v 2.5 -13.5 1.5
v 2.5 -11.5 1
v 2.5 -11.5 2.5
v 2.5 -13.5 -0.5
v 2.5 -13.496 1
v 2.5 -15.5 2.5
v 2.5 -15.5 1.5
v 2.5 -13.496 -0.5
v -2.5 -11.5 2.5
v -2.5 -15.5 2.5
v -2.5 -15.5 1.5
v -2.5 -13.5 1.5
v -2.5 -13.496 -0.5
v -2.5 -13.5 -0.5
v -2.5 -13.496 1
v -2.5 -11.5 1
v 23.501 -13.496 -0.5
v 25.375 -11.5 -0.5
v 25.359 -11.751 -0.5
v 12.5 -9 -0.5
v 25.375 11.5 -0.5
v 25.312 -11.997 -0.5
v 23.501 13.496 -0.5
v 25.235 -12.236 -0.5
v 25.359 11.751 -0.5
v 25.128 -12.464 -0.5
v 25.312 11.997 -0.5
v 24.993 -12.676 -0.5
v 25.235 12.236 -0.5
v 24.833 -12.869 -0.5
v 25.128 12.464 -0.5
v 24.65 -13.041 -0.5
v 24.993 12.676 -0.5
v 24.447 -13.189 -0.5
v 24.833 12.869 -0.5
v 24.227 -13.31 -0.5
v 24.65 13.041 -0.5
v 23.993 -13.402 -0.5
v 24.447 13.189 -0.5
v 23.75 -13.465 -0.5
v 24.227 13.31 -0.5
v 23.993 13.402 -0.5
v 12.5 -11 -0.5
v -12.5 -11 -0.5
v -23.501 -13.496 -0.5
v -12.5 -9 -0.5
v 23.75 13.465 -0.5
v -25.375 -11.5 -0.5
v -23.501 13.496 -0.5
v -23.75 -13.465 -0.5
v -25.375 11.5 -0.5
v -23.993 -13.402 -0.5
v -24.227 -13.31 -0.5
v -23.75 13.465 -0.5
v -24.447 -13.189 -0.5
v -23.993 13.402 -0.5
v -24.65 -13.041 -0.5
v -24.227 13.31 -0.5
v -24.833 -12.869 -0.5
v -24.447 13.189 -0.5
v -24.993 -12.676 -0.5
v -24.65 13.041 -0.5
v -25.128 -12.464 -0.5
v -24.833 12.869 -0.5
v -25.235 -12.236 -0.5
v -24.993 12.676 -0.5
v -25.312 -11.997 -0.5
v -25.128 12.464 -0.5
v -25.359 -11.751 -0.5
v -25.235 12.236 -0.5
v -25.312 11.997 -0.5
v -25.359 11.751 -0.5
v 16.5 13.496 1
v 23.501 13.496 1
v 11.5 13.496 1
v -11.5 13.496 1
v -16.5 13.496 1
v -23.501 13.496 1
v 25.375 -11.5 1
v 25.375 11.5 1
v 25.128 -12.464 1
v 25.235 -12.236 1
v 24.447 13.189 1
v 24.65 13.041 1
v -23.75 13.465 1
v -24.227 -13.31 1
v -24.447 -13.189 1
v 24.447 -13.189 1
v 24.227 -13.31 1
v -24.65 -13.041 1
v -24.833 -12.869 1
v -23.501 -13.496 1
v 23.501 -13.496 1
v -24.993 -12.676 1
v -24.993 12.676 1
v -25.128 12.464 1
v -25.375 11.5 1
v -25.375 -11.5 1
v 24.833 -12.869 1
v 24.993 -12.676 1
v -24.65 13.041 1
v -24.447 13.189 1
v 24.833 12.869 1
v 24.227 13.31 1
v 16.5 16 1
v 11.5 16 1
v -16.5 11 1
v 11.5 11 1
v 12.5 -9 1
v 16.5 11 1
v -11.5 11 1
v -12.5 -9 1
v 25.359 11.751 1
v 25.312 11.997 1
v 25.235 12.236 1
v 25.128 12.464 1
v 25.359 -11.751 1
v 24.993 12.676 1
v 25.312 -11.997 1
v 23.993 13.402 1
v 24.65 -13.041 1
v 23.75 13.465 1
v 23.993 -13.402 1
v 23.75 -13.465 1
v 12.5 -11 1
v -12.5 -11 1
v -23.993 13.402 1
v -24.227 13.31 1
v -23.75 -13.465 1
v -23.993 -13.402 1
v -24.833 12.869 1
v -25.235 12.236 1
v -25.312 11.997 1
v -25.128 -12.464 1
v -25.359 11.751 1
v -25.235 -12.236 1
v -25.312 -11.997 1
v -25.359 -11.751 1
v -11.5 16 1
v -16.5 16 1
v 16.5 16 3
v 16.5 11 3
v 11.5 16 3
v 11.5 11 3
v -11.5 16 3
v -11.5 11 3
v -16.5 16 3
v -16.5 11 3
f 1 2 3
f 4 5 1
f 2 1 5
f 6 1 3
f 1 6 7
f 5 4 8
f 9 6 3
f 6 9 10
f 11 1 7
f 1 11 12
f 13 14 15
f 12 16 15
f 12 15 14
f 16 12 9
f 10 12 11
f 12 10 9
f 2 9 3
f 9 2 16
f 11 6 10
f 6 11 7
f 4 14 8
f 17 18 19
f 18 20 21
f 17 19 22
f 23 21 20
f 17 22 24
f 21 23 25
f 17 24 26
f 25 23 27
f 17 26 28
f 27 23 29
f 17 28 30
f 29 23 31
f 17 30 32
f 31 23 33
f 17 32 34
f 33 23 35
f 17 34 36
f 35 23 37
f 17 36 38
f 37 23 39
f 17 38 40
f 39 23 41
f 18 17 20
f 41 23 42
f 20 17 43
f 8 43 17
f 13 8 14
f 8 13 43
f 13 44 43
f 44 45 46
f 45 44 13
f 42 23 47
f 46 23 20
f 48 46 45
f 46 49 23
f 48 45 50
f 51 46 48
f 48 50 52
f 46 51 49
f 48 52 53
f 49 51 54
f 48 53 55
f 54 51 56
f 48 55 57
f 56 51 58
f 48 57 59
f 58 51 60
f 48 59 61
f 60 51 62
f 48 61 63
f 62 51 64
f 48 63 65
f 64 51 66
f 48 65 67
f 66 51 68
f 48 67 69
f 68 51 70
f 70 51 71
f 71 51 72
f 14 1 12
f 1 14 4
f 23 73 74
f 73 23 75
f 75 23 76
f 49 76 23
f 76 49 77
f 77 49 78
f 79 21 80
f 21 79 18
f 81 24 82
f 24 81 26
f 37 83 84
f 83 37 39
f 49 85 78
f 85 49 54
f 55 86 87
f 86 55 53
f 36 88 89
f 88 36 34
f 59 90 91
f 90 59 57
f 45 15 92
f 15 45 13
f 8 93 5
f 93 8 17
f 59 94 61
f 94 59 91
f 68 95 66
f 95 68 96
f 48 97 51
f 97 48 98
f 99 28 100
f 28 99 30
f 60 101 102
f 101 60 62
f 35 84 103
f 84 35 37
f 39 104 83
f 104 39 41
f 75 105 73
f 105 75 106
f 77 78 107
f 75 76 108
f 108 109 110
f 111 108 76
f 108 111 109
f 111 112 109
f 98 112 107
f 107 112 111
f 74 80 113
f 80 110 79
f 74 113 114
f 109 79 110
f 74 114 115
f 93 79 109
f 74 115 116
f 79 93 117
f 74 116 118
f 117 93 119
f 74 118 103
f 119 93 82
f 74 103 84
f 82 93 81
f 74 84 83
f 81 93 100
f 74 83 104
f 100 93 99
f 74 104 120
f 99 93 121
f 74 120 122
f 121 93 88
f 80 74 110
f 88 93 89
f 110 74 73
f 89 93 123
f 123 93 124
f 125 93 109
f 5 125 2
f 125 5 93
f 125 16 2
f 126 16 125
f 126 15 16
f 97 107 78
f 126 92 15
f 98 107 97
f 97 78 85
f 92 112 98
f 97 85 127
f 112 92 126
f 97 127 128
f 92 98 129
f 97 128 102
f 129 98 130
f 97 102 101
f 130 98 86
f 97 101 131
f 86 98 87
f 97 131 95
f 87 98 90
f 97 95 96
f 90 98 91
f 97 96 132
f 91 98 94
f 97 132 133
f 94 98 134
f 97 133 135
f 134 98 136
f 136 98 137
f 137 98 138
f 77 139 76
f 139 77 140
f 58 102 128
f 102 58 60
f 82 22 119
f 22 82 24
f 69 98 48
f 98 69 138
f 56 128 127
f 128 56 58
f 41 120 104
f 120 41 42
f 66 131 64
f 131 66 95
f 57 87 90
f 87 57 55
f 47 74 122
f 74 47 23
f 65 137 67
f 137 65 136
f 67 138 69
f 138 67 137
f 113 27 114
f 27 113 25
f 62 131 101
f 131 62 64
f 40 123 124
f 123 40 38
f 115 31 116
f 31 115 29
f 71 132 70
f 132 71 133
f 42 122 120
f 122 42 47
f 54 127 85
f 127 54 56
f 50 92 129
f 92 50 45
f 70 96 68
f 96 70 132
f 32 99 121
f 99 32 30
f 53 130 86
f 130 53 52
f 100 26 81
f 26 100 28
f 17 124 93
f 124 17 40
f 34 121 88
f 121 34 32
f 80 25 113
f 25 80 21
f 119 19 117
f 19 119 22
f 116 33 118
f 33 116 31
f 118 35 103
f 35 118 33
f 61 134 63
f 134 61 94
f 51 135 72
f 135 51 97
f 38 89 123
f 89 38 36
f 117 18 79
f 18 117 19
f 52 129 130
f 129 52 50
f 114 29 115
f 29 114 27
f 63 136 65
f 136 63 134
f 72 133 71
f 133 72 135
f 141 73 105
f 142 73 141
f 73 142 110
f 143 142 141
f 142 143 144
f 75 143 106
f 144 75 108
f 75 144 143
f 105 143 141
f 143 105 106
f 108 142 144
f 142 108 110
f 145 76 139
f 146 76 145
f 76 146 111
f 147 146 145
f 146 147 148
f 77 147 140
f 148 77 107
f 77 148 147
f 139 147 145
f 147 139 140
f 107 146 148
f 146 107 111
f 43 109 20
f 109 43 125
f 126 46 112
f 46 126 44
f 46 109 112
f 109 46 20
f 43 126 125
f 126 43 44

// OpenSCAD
//battery cover for AMIR DE1-CP9
difference(){
   
   union(){
       //main body
       minkowski(){
        cube([46.75, 23, 1], center=true);
        cylinder($fn=50, r=2,h=0.5);
        }
       //rront Clip
       translate([14,13.5,2])
        cube([5, 5, 2], center=true);
        translate([-14,13.5,2])
        cube([5, 5, 2], center=true);
       //rear Clip
       union(){
        translate([0,-13.5,2])
        cube([5, 4, 1], center=true);
           
       translate([0,-12.5,1])
        cube([5, 2, 3], center=true);
       }
       }
      //recess
       translate([0,-10,0])
        cube([25, 2, 3], center=true);
    
       }
  
